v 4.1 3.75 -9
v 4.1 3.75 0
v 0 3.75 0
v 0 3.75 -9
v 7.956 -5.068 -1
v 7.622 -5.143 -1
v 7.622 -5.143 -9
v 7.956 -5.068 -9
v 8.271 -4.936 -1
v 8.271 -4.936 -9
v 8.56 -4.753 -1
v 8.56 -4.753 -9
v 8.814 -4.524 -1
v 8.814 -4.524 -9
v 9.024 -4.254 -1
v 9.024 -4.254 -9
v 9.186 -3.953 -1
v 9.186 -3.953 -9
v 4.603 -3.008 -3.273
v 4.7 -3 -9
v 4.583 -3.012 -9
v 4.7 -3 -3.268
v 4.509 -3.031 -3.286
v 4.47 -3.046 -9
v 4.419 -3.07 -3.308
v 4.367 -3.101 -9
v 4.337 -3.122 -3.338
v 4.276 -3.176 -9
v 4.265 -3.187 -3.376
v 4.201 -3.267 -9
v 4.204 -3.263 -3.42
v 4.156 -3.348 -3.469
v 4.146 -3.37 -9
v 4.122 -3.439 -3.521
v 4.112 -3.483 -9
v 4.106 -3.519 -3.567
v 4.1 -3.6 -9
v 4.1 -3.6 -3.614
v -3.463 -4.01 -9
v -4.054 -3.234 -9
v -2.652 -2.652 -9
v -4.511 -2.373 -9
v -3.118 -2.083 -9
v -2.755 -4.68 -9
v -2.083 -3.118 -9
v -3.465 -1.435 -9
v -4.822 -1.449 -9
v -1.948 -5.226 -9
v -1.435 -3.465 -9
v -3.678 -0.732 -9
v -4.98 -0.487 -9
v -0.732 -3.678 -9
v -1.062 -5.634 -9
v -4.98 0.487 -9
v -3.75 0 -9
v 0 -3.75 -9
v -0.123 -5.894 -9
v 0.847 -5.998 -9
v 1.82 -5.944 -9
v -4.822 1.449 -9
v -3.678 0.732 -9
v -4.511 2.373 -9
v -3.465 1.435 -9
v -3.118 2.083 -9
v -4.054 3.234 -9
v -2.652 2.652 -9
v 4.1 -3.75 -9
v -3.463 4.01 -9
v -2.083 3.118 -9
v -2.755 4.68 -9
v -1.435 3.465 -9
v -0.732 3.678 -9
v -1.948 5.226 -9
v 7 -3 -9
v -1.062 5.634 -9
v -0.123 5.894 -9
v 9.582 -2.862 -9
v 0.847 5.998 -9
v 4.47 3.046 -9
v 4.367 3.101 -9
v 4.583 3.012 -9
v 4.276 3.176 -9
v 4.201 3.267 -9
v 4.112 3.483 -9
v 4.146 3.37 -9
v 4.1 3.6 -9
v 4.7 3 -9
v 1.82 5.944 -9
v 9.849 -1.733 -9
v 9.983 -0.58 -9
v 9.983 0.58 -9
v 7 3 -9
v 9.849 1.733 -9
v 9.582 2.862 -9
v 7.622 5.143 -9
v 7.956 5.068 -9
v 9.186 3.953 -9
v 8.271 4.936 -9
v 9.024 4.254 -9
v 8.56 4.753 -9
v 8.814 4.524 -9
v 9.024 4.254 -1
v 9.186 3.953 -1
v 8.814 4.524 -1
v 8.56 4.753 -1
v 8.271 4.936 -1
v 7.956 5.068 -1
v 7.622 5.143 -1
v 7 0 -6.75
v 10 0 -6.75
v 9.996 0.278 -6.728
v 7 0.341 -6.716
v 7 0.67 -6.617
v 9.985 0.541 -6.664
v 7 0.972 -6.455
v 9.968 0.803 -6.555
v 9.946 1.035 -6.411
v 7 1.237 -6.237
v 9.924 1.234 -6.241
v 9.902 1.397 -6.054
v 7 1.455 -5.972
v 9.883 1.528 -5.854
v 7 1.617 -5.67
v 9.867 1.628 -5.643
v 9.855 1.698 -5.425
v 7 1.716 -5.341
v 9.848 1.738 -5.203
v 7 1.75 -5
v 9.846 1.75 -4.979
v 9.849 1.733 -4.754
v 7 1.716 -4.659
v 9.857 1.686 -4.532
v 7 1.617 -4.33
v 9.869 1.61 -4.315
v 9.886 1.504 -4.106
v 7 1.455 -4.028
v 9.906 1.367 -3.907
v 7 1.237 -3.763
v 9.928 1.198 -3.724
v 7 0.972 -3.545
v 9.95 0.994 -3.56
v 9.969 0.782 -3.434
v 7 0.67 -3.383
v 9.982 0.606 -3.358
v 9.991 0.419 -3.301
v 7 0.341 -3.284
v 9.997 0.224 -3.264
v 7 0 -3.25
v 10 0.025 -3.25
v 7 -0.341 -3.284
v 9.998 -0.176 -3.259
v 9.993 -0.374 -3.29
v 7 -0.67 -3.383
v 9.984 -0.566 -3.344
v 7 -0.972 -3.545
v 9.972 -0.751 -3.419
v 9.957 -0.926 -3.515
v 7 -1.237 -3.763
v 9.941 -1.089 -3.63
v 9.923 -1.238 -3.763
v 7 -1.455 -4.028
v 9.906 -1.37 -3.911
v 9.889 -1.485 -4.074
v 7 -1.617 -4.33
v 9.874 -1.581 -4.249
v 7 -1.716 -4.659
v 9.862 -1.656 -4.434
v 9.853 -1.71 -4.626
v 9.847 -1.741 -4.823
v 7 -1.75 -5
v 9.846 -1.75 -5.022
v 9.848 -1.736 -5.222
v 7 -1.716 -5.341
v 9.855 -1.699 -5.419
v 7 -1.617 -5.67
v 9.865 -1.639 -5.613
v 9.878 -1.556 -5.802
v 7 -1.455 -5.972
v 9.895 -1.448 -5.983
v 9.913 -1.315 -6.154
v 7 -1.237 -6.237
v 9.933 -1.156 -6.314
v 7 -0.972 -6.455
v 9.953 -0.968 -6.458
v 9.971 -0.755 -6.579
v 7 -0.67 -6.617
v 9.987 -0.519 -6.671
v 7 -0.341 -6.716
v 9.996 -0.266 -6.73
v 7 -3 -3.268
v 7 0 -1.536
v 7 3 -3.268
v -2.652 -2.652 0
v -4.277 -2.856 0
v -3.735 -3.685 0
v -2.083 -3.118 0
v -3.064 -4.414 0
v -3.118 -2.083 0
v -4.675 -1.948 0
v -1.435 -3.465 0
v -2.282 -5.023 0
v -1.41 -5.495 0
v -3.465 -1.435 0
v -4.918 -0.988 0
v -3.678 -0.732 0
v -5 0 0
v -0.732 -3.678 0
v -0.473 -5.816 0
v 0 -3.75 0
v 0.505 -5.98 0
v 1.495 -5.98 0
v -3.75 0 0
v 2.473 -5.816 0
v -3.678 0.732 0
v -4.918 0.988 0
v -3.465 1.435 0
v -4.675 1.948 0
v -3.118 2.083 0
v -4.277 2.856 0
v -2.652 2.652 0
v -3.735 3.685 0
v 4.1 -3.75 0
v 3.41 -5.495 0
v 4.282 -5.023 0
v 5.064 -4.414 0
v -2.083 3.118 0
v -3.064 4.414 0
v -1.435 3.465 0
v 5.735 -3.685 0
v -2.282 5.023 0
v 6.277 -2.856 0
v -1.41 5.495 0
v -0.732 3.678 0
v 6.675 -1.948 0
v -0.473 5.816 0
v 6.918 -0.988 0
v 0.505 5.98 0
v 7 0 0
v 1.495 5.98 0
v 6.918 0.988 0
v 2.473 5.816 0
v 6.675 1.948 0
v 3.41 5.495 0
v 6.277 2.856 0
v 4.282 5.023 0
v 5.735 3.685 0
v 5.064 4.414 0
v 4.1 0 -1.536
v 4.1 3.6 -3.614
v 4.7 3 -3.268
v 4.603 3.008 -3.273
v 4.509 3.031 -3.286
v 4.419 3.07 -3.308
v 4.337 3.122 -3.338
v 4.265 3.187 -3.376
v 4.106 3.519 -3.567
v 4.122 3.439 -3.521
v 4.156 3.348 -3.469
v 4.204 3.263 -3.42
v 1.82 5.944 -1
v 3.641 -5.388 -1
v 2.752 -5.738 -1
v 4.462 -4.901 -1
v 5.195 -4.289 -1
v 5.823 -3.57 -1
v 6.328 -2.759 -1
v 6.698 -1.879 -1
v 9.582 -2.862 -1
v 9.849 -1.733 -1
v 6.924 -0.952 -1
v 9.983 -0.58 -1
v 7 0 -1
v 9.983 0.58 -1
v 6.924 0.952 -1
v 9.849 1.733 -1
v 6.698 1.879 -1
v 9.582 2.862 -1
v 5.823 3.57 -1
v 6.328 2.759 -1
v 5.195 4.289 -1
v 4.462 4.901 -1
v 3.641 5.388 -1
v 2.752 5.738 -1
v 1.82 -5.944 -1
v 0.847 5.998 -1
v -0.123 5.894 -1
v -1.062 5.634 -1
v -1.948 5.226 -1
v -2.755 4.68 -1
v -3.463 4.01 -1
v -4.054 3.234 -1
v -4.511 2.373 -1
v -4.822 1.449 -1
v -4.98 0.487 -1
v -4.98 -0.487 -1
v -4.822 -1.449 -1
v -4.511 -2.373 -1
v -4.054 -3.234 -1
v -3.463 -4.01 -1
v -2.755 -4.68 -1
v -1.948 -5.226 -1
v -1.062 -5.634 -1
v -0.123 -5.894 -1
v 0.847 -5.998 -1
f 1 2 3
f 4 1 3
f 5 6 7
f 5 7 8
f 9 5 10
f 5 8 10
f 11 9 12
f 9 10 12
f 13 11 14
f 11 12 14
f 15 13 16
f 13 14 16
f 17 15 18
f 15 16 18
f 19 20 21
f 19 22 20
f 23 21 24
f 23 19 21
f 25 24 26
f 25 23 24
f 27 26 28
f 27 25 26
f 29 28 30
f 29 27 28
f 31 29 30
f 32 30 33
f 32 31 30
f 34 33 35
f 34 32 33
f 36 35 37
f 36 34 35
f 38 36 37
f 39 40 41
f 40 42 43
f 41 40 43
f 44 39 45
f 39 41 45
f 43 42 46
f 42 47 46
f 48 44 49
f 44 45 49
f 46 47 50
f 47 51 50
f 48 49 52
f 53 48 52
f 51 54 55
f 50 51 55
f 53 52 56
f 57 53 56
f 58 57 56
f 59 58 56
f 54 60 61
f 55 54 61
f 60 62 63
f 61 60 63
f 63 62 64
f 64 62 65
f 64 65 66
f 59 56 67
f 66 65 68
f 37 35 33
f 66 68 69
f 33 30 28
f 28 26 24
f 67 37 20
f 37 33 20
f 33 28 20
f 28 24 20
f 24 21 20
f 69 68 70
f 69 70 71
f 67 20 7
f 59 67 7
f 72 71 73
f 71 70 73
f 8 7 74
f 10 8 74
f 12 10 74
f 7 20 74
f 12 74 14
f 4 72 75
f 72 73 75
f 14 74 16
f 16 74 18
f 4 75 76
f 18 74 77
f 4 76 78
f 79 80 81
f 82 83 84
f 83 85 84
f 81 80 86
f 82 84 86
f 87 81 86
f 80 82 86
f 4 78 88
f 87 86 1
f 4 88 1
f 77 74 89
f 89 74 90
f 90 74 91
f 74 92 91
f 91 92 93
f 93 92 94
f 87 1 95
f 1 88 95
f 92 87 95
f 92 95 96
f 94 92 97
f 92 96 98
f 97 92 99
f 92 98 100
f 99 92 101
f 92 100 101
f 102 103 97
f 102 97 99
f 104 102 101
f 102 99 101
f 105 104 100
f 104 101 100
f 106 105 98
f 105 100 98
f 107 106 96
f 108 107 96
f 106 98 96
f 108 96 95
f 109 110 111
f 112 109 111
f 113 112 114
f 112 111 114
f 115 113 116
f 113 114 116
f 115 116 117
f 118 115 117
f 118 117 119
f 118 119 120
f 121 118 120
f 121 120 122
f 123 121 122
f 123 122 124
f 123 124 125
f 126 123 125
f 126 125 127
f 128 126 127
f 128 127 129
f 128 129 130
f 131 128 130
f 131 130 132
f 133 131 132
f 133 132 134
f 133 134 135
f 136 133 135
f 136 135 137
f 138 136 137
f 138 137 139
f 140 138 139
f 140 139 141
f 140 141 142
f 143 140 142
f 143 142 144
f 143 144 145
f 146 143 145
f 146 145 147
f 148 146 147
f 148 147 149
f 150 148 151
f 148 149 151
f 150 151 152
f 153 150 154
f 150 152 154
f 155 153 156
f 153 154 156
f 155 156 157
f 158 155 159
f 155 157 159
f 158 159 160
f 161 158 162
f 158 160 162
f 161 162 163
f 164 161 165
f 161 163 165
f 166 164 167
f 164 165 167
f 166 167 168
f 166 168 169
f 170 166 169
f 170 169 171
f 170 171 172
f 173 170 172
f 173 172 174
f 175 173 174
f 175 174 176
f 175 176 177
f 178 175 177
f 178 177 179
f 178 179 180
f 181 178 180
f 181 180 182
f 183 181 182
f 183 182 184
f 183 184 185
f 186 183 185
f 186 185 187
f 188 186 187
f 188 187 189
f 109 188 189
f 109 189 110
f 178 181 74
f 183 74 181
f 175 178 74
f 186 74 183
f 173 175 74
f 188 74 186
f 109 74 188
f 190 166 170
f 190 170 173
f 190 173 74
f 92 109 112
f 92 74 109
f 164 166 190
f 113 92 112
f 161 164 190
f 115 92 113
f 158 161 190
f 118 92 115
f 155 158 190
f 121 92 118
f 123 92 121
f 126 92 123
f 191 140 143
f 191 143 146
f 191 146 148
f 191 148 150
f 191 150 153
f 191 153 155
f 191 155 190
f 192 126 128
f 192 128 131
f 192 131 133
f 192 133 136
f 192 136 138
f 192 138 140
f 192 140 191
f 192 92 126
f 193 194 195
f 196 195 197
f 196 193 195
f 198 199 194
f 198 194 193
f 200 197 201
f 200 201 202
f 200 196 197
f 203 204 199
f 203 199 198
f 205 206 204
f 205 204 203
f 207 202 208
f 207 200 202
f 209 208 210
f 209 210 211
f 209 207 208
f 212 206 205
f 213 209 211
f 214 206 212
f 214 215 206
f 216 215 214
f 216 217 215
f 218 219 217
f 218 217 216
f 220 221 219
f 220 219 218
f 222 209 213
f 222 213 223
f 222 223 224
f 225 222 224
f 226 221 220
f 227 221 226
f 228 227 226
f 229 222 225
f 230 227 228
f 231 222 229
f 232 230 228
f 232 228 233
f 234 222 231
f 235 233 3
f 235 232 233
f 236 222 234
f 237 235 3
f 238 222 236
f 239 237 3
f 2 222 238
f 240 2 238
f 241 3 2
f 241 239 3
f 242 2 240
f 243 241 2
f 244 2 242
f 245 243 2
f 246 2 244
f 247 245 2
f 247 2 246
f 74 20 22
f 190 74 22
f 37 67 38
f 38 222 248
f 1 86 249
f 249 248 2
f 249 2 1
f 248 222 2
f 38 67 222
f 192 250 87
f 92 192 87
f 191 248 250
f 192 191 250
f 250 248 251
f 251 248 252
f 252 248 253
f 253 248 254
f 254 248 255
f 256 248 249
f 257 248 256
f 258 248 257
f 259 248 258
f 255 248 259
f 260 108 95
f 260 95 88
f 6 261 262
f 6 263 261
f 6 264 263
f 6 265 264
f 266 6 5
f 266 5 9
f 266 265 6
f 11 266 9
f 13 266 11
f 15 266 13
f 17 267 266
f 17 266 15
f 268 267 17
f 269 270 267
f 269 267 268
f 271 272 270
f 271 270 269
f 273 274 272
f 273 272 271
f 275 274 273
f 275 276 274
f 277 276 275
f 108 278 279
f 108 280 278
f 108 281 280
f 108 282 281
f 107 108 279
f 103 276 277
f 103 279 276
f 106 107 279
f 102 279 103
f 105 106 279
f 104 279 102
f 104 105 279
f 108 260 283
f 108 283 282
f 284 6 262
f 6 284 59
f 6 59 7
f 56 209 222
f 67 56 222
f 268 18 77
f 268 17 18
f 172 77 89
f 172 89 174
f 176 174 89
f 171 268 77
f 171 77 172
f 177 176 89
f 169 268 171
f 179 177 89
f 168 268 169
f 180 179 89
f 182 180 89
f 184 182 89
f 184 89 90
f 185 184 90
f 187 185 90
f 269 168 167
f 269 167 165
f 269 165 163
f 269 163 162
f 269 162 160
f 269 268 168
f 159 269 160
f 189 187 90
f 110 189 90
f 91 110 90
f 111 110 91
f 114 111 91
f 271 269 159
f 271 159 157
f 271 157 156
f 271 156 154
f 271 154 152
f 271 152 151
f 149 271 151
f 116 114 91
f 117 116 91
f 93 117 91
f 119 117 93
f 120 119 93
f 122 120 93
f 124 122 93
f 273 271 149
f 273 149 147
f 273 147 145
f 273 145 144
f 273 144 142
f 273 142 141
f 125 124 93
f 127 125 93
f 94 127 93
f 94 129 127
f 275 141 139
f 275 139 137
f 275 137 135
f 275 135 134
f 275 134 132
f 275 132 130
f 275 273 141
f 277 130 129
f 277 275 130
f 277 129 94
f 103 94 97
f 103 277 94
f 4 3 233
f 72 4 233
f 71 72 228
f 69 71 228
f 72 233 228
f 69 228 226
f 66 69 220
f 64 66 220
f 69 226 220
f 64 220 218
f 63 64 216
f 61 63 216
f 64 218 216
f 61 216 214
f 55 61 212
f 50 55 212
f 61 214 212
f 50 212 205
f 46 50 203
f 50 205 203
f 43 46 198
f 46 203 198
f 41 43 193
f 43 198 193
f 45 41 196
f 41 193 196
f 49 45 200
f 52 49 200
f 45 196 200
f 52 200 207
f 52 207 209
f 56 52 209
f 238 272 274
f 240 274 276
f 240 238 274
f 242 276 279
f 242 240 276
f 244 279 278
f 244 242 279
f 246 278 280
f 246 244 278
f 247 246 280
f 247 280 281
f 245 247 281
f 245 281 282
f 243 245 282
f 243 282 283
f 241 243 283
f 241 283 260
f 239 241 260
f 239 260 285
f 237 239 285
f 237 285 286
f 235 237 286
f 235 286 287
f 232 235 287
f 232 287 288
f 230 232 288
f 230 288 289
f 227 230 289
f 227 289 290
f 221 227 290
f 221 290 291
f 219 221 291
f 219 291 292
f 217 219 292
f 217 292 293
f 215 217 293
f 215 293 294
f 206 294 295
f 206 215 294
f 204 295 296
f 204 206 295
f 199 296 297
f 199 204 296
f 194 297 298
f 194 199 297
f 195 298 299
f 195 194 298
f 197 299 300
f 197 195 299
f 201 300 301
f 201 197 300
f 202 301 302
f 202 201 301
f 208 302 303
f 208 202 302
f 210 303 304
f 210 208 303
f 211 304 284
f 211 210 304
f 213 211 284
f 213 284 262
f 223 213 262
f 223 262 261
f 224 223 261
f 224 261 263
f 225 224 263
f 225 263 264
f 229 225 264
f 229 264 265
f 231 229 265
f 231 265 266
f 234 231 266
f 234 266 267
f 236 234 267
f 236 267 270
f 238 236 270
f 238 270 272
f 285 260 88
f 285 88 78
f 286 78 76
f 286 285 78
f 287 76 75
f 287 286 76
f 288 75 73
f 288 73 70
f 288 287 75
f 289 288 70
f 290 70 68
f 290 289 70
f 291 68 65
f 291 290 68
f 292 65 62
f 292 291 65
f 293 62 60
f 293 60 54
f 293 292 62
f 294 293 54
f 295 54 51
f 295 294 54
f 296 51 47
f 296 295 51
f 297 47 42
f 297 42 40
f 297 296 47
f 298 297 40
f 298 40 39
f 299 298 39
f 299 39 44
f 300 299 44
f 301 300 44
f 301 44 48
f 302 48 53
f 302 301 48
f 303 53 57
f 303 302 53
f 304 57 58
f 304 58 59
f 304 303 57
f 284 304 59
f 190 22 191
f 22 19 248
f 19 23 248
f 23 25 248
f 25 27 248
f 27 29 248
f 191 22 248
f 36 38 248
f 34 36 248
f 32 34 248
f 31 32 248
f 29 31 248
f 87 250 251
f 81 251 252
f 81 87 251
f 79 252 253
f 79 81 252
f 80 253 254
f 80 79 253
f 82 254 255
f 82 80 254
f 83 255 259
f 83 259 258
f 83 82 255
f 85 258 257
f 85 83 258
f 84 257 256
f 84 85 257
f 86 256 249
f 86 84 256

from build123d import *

# Parameters (mm, degrees)
BOSS_EXTRUDE1_DEPTH = 8
BOSS_EXTRUDE2_START = 1
SKETCH2_R           = 6
BOSS_EXTRUDE2_DEPTH = 1
CUT_EXTRUDE1_DEPTH  = 15.730919863
CUT_EXTRUDE2_DEPTH  = 2.9
HOLEWZD1_D          = 3.5
HOLEWZD1_DEPTH      = 3
FILLET1_R           = 0.6
FILLET2_R           = 2


with BuildPart() as part:
    # Sketch1 → Boss-Extrude1 (new body)
    with BuildSketch(Plane.XY.offset(-1)):
        with BuildLine():
            Line((8.660254038, 5), (1.820011325, 5.943700987))
            ThreePointArc((1.820011325, 5.943700987), (-5, 0), (1.820011325, -5.943700987))
            Line((1.820011325, -5.943700987), (8.660254038, -5))
            ThreePointArc((8.660254038, -5), (10, 0), (8.660254038, 5))
        make_face()
    extrude(amount=-BOSS_EXTRUDE1_DEPTH)

    # Sketch2 → Boss-Extrude2 (add)
    with BuildSketch(Plane.XY.offset(-1).offset(BOSS_EXTRUDE2_START)):
        with Locations((1, 0)):
            Circle(SKETCH2_R)
    extrude(amount=-BOSS_EXTRUDE2_DEPTH)

    # Sketch3 → Cut-Extrude1 (cut, through all)
    with BuildSketch(Plane.XY):
        with BuildLine():
            Line((0, -3.75), (4.1, -3.75))
            Line((4.1, -3.75), (4.1, 3.75))
            Line((4.1, 3.75), (0, 3.75))
            ThreePointArc((0, 3.75), (-3.75, 0), (0, -3.75))
        make_face()
    extrude(amount=-CUT_EXTRUDE1_DEPTH, mode=Mode.SUBTRACT)

    # Sketch4 → Cut-Extrude2 (cut)
    with BuildSketch(Plane.ZY.offset(-4.1)):
        Polygon((-9, -3), (-3.267949192, -3), (-1.535898385, 0), (-3.267949192, 3), (-9, 3), align=None)
    extrude(amount=-CUT_EXTRUDE2_DEPTH, mode=Mode.SUBTRACT)

    # HoleWzd1
    with Locations(Plane.ZY.offset(-7)):
        with Locations((-5, 0)):
            Hole(HOLEWZD1_D / 2, depth=HOLEWZD1_DEPTH)

    # Fillet1
    fillet1_edges = [part.edges().sort_by_distance(p)[0] for p in [
        (4.1, -3, -6.133974596),
        (4.1, 3, -6.133974596),
    ]]
    fillet(fillet1_edges, radius=FILLET1_R)

    # Fillet2
    fillet2_edges = [part.edges().sort_by_distance(p)[0] for p in [
        (8.660254038, -5, -5),
        (8.660254038, 5, -5),
    ]]
    fillet(fillet2_edges, radius=FILLET2_R)


solid = part.part
